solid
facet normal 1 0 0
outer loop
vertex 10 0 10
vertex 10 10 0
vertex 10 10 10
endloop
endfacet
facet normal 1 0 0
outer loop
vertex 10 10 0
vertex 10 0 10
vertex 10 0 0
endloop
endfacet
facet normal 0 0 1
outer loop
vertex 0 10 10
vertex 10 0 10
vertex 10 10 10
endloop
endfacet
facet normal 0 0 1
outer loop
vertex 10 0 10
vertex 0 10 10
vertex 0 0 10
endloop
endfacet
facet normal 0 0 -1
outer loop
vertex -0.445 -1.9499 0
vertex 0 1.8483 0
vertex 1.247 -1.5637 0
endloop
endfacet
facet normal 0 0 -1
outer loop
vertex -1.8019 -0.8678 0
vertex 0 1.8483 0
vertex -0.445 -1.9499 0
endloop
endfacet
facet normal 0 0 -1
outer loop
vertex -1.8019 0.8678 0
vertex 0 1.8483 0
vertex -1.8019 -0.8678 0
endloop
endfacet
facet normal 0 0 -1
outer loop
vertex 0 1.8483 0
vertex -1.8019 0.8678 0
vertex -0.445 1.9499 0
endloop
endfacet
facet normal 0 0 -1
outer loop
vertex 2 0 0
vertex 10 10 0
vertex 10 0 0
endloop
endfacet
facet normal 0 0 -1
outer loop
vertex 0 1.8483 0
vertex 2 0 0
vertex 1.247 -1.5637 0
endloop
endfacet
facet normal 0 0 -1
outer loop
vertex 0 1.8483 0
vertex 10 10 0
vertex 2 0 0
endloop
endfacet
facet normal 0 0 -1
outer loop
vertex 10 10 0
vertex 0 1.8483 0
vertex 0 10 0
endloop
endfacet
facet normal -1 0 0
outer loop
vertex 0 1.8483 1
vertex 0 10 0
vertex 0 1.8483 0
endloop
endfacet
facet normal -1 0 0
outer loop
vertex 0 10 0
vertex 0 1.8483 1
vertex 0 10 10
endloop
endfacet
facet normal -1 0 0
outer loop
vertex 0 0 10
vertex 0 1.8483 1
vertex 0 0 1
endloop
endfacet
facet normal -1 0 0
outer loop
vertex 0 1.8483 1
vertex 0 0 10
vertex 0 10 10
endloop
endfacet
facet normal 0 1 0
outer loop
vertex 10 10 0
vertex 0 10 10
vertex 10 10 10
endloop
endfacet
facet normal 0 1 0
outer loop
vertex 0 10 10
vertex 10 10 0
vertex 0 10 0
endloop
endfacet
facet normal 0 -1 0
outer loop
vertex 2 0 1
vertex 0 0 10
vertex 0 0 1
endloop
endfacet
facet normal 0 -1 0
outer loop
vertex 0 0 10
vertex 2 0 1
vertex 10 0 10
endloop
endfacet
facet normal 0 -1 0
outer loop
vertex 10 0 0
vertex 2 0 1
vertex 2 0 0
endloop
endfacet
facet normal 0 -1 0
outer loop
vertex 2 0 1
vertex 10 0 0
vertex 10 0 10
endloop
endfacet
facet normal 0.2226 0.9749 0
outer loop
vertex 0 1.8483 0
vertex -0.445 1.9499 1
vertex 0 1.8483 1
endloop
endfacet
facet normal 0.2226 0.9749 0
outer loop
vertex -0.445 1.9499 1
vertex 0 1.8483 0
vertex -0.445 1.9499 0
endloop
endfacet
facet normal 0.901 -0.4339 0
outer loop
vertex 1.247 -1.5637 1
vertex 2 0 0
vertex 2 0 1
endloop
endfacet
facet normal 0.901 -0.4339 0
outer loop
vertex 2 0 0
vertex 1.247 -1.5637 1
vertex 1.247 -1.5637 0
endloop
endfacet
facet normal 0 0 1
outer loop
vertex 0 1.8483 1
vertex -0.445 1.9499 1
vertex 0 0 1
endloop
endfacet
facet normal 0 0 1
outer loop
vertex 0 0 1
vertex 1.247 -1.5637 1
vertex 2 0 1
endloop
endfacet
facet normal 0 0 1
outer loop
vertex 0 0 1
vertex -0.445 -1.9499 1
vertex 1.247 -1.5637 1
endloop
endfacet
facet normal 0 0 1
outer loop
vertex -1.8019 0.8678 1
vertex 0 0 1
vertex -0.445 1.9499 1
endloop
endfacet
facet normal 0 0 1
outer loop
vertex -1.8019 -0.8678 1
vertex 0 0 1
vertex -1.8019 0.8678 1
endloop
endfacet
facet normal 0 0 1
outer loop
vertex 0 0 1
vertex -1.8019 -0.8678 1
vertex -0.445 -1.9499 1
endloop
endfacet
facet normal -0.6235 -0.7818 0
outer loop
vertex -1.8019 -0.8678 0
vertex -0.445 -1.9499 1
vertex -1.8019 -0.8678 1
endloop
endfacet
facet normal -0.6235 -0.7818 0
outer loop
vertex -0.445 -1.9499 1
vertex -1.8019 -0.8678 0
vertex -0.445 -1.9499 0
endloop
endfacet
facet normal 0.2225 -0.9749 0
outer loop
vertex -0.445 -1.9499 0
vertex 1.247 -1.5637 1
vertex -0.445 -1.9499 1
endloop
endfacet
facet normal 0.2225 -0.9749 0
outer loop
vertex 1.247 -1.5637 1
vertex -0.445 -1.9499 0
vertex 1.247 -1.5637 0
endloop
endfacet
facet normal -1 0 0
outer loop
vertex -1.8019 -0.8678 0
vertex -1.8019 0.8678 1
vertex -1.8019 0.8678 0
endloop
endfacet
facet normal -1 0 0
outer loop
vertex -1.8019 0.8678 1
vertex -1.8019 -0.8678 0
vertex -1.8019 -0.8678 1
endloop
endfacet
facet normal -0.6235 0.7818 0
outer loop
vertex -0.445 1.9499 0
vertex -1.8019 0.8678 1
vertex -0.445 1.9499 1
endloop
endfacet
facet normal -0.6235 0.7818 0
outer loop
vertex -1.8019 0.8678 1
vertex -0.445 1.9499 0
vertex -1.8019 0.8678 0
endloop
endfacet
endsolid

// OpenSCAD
// file: common.scad
// common.scad - CC0 Public Domain
module frame(w) cube(w);
// file: gears.scad
// gears.scad - GPL-3.0
module gear() cylinder(h = 1, r = 2);
// file: b.scad
// b.scad - Apache-2.0
include <common.scad>
module bracket() frame(2);
// file: a.scad
// a.scad - MIT License
include <common.scad>
module widget(w) frame(w);
// main file
// Widget v1 - (c) 2026 Root Author, CC-BY-4.0
include <a.scad>
include <b.scad>
use <gears.scad>

/* [Size] */
width = 10; // [1:100]

widget(width);
bracket();
gear();
